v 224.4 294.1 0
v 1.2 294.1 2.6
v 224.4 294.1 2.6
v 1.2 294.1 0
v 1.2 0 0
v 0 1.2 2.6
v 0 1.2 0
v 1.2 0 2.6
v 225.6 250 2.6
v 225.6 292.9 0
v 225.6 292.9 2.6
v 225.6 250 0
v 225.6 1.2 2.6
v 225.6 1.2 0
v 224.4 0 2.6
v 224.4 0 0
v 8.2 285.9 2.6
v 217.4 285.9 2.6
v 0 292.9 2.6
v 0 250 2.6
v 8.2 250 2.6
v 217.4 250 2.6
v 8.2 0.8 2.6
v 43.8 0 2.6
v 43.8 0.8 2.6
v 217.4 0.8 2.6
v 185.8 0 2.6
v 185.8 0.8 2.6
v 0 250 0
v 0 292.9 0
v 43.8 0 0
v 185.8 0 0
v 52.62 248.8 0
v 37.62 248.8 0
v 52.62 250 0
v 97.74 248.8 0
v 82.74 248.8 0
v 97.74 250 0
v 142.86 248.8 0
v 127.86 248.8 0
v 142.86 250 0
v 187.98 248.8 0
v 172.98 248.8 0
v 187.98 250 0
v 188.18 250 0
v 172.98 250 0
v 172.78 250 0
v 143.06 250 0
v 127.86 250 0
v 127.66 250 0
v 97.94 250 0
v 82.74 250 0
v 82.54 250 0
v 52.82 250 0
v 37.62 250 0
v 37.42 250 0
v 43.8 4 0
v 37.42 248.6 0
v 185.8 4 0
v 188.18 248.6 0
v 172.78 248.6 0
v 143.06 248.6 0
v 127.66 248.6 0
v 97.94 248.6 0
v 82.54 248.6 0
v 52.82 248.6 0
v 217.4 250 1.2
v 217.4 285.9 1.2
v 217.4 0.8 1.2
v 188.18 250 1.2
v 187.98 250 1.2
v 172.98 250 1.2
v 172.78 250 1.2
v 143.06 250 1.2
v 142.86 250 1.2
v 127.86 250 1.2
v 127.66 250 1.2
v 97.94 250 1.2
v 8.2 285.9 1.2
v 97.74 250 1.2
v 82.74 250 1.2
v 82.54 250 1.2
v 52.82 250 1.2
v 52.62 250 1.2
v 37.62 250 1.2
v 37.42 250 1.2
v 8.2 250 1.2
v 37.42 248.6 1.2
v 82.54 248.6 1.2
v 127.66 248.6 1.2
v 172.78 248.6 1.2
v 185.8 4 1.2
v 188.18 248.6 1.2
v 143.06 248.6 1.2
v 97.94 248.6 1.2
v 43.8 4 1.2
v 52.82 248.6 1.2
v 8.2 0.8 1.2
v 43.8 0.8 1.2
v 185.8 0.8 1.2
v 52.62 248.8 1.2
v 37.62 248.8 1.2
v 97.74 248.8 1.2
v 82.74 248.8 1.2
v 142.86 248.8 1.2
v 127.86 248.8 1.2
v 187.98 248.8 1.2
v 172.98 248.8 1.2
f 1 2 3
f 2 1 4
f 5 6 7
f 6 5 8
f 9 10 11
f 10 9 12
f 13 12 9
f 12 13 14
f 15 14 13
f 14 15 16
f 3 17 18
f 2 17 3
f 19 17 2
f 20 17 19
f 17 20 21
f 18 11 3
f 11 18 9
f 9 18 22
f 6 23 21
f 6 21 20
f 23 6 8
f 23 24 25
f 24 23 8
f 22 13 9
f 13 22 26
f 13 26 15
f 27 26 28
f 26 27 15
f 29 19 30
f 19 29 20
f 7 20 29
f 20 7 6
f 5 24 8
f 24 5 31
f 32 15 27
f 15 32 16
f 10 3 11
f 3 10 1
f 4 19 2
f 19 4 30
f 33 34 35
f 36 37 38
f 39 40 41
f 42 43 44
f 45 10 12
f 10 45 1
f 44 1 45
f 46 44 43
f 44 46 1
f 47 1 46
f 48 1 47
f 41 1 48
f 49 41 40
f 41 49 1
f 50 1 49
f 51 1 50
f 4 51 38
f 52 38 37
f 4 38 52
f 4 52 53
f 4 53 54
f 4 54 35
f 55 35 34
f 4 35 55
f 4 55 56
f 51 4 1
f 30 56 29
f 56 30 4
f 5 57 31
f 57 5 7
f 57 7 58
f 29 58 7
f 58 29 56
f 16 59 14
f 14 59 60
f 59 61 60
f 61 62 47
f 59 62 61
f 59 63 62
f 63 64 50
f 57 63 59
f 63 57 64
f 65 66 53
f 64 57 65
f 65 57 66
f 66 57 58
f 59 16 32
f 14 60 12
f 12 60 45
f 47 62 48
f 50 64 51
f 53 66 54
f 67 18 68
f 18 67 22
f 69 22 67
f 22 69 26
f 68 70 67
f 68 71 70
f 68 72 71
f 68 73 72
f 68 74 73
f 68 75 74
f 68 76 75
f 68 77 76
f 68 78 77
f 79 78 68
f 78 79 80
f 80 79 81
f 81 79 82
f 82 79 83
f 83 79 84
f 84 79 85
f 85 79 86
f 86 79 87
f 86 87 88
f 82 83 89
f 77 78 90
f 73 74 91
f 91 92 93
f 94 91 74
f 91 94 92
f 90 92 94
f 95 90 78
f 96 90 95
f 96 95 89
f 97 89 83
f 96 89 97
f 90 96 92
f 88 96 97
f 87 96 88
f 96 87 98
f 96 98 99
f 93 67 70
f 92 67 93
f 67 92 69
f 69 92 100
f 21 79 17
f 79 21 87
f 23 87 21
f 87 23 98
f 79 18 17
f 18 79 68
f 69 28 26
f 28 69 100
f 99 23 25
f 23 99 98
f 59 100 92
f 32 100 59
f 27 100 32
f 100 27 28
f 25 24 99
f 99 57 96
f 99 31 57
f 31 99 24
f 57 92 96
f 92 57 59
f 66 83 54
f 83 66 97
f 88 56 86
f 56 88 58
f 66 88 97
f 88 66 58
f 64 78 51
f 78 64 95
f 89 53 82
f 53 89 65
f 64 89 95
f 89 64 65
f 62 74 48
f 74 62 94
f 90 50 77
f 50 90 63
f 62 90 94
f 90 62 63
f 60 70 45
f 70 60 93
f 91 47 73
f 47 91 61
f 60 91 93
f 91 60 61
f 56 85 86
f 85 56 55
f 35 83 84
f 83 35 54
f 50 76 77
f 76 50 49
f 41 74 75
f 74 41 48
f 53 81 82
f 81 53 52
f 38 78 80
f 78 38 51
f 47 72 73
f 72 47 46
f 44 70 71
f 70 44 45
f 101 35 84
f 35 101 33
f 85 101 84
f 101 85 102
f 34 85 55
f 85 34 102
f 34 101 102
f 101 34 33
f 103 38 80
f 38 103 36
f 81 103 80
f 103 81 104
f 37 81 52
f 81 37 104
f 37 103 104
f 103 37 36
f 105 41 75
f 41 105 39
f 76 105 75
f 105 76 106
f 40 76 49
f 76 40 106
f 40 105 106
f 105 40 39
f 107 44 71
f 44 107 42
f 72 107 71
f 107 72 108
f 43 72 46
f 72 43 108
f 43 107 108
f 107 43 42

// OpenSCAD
// file: back_panel_top.scad
// ============================================================
// Back Panel - Top (small piece, ~60mm tall)
// ============================================================
include <common.scad>

module back_panel_top() {
    difference() {
        back_panel_full();
        // Cut away bottom portion
        translate([-1, -1, -1])
            cube([panel_w + 2, back_split_y + 1, frame_d + 2]);
    }
    // Tongue tabs extending below the cut edge
    tongue_strip(panel_w, back_split_y - tongue_depth, 0, tongue_depth, tongue_length, tongue_count);
}

back_panel_top();
// file: back_panel_bottom.scad
// ============================================================
// Back Panel - Bottom (large piece, ~250mm tall, includes FPC slot)
// ============================================================
include <common.scad>

module back_panel_bottom() {
    difference() {
        back_panel_full();
        // Cut away top portion
        translate([-1, back_split_y, -1])
            cube([panel_w + 2, panel_h + 2, frame_d + 2]);
        // Groove slots to receive tongues from top piece
        // Cut through full back wall depth (back_thick + margin)
        groove_y = back_split_y - tongue_depth - tol;
        groove_depth = tongue_depth + 2 * tol;
        groove_len = tongue_length + 2 * tol;
        groove_spacing = panel_w / (tongue_count + 1);
        for (i = [1 : tongue_count]) {
            translate([i * groove_spacing - groove_len / 2, groove_y, -0.1])
                cube([groove_len, groove_depth, back_thick + 0.2]);
        }
    }
}

back_panel_bottom();
// file: common.scad
// ============================================================
// Photo Frame for 13.3" Spectra 6 E-Ink Display
// Shared parameters and utility modules
// ============================================================

/* [Display Parameters] */
// Active (visible) area
active_w = 202.8;
active_h = 270.4;
// Glass outline dimensions
glass_w = 208.8;
glass_h = 284.7;
display_d = 0.85;
// Non-active border (asymmetric)
border_left   = 3.0;
border_right  = 3.0;
border_top    = 3.0;
border_bottom = 11.3;   // 284.7 - 270.4 - 3 = 11.3, FPC side, large non-active area

/* [Driver Board Parameters] */
board_w = 80;
board_h = 40;
board_d = 1.6;
board_clearance = 10;     // component height clearance

/* [Battery Parameters] */
battery_w = 60;
battery_h = 35;
battery_d = 8;

/* [Frame Parameters] */
bezel_w    = 10;          // bezel width around active area
wall_thick = 2.4;         // front frame thickness
back_thick = 1.2;         // back panel thickness (6 layers @ 0.2mm)
frame_d    = 2.6;         // total frame depth (1.2mm back + 1.4mm cavity)
tol        = 0.2;
corner_r   = 3;

/* [Channel Parameters] */
outer_wall  = 2.0;        // outer wall thickness on bezel
inner_lip_d = 0.3;        // inner lip depth (presses on display)
channel_tol = 0.2;        // clearance for back panel in channel
lip_overlap = 2.0;        // how much bezel overlaps the glass on each side

/* [Printer Limits] */
bed_max = 260;

/* [Stand Parameters] */
stand_angle = 12;         // tilt angle in degrees
stand_foot_depth = 100;   // how far the base extends back

/* [FPC Cable] */
// 60-pin FPC exits from bottom of display, offset 2mm to the right
fpc_w = 134;              // FPC ribbon width
fpc_slot_w = fpc_w + 8;   // slot width with clearance (+4mm wider)
fpc_offset_x = 2;         // shifted 2mm to the right from center
fpc_slot_h = 6;

/* [Buttons - 1 reset + 3 custom] */
button_dia     = 3.5;
button_spacing = 12;
button_count   = 4;

/* [Joint Parameters] */
tongue_depth  = 1.2;      // tongue-and-groove interlock depth
tongue_length = 15;        // each tongue segment length
tongue_count  = 4;         // number of tongue segments along width
screw_r       = 1.5;       // M3 screw radius

// ============================================================
// Derived dimensions
// ============================================================

cavity_w = glass_w + 2 * tol;
cavity_h = glass_h + 2 * tol;

frame_w = cavity_w + 2 * bezel_w;
frame_h = cavity_h + 2 * bezel_w;

// Back panel rim widths (design parameters)
panel_rim  = 8.2;    // rim on left, right, top
bottom_rim = 0.8;    // thin bottom rim (hidden in base)

// Derived panel dimensions
panel_w = cavity_w + 2 * panel_rim;
panel_h = cavity_h + panel_rim + bottom_rim;
panel_inset = (frame_w - panel_w) / 2;  // how far panel is inset from bezel edge

// Inner lip width: derived to fill gap between panel rim and window
// Layout: outer_wall + channel_tol + panel_rim + channel_tol + inner_lip_w = win_x
inner_lip_w = bezel_w + tol + lip_overlap - outer_wall - panel_rim - 2 * channel_tol;

// Back panel split: bottom piece as tall as fits the bed
back_split_y = bed_max - 10;   // 250mm from bottom, top piece ~60mm

// Base dimensions (foot/stand only, attaches to bottom of back panel)
base_wall = wall_thick;
base_total_depth = stand_foot_depth;

// ============================================================
// Utility modules
// ============================================================

module rounded_rect(w, h, d, r) {
    linear_extrude(d)
        offset(r = r)
            offset(r = -r)
                square([w, h]);
}

module rounded_rect_2d(w, h, r) {
    offset(r = r)
        offset(r = -r)
            square([w, h]);
}

// Tongue segments along X axis at a given Y position
module tongue_strip(width, y_pos, z_pos, depth, length, count) {
    spacing = width / (count + 1);
    for (i = [1 : count]) {
        translate([i * spacing - length / 2, y_pos, z_pos])
            cube([length, depth, back_thick]);
    }
}

// ============================================================
// Front bezel - mitered picture frame style (4 sides)
// ============================================================

// Window position and size (derived from glass position + lip overlap)
win_x = bezel_w + tol + lip_overlap;
win_y = bezel_w + tol + lip_overlap;
win_w = glass_w - 2 * lip_overlap;
win_h = glass_h - 2 * lip_overlap;

// Bezel Z layout:
//   z=0                           bottom of outer wall (back of frame)
//   z=frame_d                     bezel body bottom (= back panel top)
//   z=frame_d+wall_thick          bezel front face

module front_bezel_full() {
    union() {
        // 1. Bezel body (visible frame, sits on top of back panel)
        difference() {
            translate([0, 0, frame_d])
                rounded_rect(frame_w, frame_h, wall_thick, corner_r);

            // Window opening - sharp corners (display glass is rectangular)
            translate([win_x, win_y, -0.1])
                cube([win_w, win_h, frame_d + wall_thick + 0.2]);
        }

        // 2. Outer wall (wraps around back panel edge)
        difference() {
            rounded_rect(frame_w, frame_h, frame_d + wall_thick, corner_r);

            // Hollow inside - sharp corners
            translate([outer_wall, outer_wall, -0.1])
                cube([
                    frame_w - 2 * outer_wall,
                    frame_h - 2 * outer_wall,
                    frame_d + wall_thick + 0.2
                ]);
        }

        // 3. Inner lip (presses on display glass)
        difference() {
            translate([win_x - inner_lip_w, win_y - inner_lip_w, frame_d - inner_lip_d])
                cube([win_w + 2 * inner_lip_w, win_h + 2 * inner_lip_w, inner_lip_d]);

            translate([win_x, win_y, frame_d - inner_lip_d - 0.1])
                cube([win_w, win_h, inner_lip_d + 0.2]);
        }
    }
}

// 45-degree miter cutting regions for each side
// Each region is a 2D polygon extruded tall enough to cut the bezel
e = 1; // margin for clean cuts

// Bottom: below both 45° lines from bottom corners
module miter_region_bottom() {
    linear_extrude(50, center = true)
        polygon([[-e, -e], [frame_w + e, -e], [frame_w / 2, frame_w / 2]]);
}

// Top: above both 45° lines from top corners
module miter_region_top() {
    linear_extrude(50, center = true)
        polygon([[-e, frame_h + e], [frame_w + e, frame_h + e],
                 [frame_w / 2, frame_h - frame_w / 2]]);
}

// Left: between 45° lines from both left corners
module miter_region_left() {
    linear_extrude(50, center = true)
        polygon([[-e, -e], [frame_h / 2, frame_h / 2], [-e, frame_h + e]]);
}

// Right: between 45° lines from both right corners
module miter_region_right() {
    linear_extrude(50, center = true)
        polygon([[frame_w + e, -e],
                 [frame_w - frame_h / 2, frame_h / 2],
                 [frame_w + e, frame_h + e]]);
}

// Full back panel (smaller than bezel, fits inside channel)
module back_panel_full() {
    // FPC slot X position: centered + offset to the right
    fpc_x = (panel_w - fpc_slot_w) / 2 + fpc_offset_x;

    difference() {
        rounded_rect(panel_w, panel_h, frame_d, max(corner_r - panel_inset, 0.5));

        // Display cavity
        translate([panel_rim, bottom_rim, back_thick])
            cube([cavity_w, cavity_h, frame_d]);

        // FPC cable exit slot at bottom (offset 2mm to right)
        translate([fpc_x, -0.1, back_thick])
            cube([fpc_slot_w, bottom_rim + 0.1, frame_d - back_thick + 0.1]);

        // FPC ribbon gap: 4mm zone from panel bottom edge
        // Goes through the full back wall so ribbon can fold freely
        fpc_gap = 4;
        translate([fpc_x, 0, -0.1])
            cube([fpc_slot_w, fpc_gap, frame_d + 0.1]);
    }
}
// main file
// ============================================================
// Display fitted into the back panel
// Shows how the glass sits in the cavity
// ============================================================
include <common.scad>
use <back_panel_bottom.scad>
use <back_panel_top.scad>

// Back panel bottom
color("SlateGray")
    back_panel_bottom();

// Back panel top
color("DimGray")
    back_panel_top();

// Display glass (ghost)
%translate([panel_rim, bottom_rim, back_thick])
    color("LightBlue", 0.5)
        cube([glass_w, glass_h, display_d]);

// FPC ribbon cable (ghost)
%translate([(panel_w - fpc_w) / 2 + fpc_offset_x, bottom_rim, back_thick])
    color("Orange", 0.5)
        cube([fpc_w, 3, 0.3]);
